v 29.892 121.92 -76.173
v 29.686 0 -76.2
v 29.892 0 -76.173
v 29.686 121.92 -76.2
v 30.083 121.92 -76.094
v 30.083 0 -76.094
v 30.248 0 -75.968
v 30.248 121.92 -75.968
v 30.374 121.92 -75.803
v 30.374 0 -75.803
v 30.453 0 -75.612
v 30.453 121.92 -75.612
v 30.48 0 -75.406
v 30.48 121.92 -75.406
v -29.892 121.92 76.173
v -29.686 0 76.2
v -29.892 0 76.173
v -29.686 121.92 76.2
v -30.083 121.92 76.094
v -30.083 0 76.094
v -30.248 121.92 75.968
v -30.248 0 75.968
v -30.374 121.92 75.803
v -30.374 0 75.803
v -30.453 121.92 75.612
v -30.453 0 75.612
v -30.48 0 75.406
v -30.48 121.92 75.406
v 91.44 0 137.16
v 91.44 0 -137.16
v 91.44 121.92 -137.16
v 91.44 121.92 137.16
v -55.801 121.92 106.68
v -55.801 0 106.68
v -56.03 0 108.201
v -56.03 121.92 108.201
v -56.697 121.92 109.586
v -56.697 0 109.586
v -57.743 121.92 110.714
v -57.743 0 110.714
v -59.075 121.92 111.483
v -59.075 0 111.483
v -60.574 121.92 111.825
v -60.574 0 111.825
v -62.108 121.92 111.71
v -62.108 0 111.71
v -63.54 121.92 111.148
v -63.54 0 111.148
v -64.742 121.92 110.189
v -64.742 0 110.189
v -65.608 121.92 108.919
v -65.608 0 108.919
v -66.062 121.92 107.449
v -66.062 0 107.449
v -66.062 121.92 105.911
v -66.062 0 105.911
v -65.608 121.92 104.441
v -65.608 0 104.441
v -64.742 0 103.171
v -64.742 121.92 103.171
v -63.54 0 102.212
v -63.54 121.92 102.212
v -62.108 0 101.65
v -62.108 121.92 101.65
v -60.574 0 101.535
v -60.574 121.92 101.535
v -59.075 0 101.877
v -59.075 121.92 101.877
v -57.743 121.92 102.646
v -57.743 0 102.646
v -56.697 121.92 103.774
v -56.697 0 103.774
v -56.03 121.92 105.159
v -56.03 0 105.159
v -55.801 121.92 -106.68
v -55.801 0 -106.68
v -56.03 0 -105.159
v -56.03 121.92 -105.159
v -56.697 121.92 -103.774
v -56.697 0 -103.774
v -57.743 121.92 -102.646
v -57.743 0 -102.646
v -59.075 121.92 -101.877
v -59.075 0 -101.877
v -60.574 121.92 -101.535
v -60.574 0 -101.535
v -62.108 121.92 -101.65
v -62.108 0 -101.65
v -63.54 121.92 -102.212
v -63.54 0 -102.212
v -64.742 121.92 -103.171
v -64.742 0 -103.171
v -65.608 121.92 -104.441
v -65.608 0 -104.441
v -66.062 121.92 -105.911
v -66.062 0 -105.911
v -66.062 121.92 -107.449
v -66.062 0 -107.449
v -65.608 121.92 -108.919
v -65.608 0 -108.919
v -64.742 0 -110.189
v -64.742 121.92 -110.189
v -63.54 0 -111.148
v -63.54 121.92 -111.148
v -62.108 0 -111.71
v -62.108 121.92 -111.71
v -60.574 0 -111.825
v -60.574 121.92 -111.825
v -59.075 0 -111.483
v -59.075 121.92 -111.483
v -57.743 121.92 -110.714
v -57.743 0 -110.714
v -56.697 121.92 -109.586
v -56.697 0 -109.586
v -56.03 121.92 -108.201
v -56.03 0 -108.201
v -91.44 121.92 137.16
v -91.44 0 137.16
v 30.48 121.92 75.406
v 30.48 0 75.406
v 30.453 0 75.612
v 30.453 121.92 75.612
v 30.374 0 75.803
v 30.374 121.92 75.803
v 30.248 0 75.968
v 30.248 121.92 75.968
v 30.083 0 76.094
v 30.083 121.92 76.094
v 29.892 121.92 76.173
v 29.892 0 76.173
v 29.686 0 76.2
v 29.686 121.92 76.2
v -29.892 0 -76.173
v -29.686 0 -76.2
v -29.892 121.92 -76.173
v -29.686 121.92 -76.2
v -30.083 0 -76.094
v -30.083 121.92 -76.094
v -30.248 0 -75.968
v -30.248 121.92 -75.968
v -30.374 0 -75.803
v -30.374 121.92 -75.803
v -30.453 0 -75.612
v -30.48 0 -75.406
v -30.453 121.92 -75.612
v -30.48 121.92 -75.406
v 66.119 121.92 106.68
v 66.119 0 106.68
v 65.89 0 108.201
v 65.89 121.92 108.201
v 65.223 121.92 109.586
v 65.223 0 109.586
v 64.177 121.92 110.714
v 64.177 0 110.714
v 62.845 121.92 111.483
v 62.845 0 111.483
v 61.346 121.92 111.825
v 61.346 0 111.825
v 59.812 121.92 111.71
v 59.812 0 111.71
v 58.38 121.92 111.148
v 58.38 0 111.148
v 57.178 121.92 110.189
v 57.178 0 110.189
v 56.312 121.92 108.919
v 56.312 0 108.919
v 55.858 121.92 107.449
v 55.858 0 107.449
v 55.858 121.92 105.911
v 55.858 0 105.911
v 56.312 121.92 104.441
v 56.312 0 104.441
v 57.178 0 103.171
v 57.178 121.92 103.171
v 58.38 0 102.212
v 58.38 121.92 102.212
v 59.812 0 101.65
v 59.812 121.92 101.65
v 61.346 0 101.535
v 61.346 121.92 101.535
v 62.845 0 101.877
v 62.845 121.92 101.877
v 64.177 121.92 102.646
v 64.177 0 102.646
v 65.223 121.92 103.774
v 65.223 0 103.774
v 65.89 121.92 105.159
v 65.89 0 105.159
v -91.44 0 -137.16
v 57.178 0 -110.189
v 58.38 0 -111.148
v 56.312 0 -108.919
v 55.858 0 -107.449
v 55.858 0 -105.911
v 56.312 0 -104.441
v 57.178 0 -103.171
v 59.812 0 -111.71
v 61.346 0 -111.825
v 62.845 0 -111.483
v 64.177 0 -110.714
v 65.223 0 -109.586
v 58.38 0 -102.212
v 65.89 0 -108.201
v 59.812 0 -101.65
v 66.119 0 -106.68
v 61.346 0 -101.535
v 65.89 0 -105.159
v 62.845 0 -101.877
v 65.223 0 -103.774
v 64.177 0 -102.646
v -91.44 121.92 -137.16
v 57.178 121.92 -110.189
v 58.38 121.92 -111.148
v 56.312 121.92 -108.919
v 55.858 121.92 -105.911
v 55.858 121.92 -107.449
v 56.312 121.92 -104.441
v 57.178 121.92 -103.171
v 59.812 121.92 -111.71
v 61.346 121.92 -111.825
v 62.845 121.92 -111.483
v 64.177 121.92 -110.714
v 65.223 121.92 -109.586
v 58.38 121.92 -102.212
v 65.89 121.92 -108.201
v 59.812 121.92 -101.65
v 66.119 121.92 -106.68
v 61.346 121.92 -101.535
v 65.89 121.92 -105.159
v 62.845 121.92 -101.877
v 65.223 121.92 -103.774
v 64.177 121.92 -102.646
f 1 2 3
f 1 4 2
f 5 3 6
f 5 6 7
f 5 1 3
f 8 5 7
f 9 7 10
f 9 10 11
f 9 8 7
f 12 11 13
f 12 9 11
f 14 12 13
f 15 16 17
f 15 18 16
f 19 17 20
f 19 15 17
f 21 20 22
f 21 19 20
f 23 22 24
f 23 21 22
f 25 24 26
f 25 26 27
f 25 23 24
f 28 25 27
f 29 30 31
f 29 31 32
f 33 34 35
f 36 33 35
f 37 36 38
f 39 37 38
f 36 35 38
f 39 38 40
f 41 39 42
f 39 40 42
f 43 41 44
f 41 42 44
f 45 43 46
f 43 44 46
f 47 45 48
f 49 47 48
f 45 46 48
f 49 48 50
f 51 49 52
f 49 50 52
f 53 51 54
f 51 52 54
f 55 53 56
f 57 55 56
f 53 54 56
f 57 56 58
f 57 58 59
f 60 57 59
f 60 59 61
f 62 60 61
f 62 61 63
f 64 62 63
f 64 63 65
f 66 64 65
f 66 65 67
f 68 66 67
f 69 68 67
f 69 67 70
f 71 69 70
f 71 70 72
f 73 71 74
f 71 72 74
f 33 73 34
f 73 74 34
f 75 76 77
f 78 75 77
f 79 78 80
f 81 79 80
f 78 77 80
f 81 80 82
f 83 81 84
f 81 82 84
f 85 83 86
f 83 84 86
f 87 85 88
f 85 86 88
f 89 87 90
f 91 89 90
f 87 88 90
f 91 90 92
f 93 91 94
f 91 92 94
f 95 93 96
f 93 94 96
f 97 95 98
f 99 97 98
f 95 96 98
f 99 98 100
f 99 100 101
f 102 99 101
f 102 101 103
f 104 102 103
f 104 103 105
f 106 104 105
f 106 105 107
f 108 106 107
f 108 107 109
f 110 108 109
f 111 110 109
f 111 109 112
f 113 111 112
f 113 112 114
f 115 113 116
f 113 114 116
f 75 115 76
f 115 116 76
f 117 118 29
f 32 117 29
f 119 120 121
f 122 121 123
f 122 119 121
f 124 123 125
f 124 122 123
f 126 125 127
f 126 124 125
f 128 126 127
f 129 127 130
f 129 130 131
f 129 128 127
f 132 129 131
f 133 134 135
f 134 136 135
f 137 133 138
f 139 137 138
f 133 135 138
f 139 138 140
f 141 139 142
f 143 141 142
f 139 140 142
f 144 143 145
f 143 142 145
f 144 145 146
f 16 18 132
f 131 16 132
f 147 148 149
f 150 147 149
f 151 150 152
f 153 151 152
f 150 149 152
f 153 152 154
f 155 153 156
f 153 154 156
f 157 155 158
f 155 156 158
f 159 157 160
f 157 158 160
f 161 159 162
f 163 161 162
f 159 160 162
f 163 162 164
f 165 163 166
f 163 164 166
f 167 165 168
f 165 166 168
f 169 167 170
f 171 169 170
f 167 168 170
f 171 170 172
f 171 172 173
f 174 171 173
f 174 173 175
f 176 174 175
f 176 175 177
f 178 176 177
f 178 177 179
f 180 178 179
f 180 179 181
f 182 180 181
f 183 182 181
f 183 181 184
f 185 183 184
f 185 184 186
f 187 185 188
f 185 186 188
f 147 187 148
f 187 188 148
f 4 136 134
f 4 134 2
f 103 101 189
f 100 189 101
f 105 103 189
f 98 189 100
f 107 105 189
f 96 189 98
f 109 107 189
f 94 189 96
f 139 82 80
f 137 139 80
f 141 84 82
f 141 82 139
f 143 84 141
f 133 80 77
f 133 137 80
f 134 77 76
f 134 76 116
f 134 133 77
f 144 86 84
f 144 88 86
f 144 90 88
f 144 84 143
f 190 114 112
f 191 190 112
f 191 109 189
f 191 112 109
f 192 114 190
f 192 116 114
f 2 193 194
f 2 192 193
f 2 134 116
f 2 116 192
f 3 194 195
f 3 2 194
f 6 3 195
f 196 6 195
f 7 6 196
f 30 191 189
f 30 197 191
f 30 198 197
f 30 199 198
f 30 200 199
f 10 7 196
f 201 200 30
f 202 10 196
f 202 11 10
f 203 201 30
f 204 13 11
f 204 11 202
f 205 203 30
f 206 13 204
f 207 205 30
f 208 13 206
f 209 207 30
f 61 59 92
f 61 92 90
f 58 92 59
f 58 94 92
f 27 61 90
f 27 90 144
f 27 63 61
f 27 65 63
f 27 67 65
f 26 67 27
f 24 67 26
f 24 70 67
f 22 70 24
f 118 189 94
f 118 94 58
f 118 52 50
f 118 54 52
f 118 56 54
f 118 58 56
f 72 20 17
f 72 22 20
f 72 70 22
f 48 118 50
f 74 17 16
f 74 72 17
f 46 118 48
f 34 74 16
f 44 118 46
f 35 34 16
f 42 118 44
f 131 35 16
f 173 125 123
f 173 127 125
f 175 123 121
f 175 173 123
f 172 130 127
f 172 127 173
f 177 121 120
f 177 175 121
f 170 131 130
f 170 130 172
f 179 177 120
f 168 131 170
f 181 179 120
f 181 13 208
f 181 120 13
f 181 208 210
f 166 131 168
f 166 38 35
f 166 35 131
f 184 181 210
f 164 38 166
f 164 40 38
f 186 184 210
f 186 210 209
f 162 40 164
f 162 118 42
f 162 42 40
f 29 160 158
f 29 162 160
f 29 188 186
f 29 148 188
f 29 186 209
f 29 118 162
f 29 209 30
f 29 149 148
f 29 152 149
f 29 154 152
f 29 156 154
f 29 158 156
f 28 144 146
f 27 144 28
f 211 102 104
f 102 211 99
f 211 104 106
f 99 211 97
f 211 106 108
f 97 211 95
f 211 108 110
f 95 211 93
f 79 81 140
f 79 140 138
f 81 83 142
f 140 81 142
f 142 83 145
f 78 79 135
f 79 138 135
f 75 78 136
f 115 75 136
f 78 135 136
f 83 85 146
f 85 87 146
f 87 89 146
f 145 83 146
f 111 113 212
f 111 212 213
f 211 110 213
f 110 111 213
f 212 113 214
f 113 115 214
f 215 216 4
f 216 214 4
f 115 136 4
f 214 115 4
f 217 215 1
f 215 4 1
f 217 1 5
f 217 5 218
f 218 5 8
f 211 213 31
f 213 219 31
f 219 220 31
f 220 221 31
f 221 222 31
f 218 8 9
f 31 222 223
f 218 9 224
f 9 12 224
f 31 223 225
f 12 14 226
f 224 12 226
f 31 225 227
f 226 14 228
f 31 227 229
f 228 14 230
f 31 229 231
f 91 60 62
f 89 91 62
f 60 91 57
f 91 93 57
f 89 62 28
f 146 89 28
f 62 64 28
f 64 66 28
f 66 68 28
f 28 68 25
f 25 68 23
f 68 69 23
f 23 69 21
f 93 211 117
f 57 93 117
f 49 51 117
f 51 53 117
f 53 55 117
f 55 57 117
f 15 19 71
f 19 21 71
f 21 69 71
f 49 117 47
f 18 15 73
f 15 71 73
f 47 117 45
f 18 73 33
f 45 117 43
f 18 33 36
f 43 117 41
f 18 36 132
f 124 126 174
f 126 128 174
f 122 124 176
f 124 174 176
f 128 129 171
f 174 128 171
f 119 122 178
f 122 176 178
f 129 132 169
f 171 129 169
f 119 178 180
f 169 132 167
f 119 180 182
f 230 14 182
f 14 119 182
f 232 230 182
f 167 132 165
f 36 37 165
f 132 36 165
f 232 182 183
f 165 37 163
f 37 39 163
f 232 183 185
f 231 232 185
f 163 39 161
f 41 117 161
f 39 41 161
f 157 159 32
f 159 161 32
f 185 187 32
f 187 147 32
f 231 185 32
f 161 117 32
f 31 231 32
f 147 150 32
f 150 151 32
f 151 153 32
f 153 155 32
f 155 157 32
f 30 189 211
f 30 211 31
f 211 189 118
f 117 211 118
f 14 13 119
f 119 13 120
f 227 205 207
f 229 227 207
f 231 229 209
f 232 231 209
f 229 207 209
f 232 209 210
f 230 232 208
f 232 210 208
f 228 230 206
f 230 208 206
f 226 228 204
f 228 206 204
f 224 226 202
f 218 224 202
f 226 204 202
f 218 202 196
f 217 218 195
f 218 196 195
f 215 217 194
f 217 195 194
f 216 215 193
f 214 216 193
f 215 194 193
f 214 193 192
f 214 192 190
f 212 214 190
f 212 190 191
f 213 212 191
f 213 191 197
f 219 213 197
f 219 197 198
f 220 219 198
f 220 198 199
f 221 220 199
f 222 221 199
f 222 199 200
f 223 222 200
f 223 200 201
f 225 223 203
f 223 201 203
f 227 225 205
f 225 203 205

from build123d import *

# Parameters (mm, degrees)
F1_W     = 182.88
F1_H     = 274.32
F2_DEPTH = 121.92
F3_R     = 5.159375
F4_DEPTH = 121.92
F5_W     = 60.96
F5_H     = 152.4
F6_DEPTH = 121.92
F7_R     = 0.79375


with BuildPart() as f2:
    # F1 (on Front) → F2 (new body)
    with BuildSketch(Plane.XZ):
        Rectangle(F1_W, F1_H)
    extrude(amount=-F2_DEPTH)

    # F3 (on face) → F4 (cut)
    with BuildSketch(Plane.XZ):
        with Locations((-60.96, 106.68)):
            Circle(F3_R)
        with Locations((60.96, 106.68)):
            Circle(F3_R)
        with Locations((-60.96, -106.68)):
            Circle(F3_R)
        with Locations((60.96, -106.68)):
            Circle(F3_R)
    extrude(amount=-F4_DEPTH, mode=Mode.SUBTRACT)

    # F5 (on face) → F6 (cut)
    with BuildSketch(Plane.XZ):
        Rectangle(F5_W, F5_H)
    extrude(amount=-F6_DEPTH, mode=Mode.SUBTRACT)

    # F7
    f7_edges = [f2.edges().sort_by_distance(p)[0] for p in [
        (-30.48, 60.96, 76.2),
        (30.48, 60.96, 76.2),
        (30.48, 60.96, -76.2),
        (-30.48, 60.96, -76.2),
    ]]
    fillet(f7_edges, radius=F7_R)


solid = f2.part
